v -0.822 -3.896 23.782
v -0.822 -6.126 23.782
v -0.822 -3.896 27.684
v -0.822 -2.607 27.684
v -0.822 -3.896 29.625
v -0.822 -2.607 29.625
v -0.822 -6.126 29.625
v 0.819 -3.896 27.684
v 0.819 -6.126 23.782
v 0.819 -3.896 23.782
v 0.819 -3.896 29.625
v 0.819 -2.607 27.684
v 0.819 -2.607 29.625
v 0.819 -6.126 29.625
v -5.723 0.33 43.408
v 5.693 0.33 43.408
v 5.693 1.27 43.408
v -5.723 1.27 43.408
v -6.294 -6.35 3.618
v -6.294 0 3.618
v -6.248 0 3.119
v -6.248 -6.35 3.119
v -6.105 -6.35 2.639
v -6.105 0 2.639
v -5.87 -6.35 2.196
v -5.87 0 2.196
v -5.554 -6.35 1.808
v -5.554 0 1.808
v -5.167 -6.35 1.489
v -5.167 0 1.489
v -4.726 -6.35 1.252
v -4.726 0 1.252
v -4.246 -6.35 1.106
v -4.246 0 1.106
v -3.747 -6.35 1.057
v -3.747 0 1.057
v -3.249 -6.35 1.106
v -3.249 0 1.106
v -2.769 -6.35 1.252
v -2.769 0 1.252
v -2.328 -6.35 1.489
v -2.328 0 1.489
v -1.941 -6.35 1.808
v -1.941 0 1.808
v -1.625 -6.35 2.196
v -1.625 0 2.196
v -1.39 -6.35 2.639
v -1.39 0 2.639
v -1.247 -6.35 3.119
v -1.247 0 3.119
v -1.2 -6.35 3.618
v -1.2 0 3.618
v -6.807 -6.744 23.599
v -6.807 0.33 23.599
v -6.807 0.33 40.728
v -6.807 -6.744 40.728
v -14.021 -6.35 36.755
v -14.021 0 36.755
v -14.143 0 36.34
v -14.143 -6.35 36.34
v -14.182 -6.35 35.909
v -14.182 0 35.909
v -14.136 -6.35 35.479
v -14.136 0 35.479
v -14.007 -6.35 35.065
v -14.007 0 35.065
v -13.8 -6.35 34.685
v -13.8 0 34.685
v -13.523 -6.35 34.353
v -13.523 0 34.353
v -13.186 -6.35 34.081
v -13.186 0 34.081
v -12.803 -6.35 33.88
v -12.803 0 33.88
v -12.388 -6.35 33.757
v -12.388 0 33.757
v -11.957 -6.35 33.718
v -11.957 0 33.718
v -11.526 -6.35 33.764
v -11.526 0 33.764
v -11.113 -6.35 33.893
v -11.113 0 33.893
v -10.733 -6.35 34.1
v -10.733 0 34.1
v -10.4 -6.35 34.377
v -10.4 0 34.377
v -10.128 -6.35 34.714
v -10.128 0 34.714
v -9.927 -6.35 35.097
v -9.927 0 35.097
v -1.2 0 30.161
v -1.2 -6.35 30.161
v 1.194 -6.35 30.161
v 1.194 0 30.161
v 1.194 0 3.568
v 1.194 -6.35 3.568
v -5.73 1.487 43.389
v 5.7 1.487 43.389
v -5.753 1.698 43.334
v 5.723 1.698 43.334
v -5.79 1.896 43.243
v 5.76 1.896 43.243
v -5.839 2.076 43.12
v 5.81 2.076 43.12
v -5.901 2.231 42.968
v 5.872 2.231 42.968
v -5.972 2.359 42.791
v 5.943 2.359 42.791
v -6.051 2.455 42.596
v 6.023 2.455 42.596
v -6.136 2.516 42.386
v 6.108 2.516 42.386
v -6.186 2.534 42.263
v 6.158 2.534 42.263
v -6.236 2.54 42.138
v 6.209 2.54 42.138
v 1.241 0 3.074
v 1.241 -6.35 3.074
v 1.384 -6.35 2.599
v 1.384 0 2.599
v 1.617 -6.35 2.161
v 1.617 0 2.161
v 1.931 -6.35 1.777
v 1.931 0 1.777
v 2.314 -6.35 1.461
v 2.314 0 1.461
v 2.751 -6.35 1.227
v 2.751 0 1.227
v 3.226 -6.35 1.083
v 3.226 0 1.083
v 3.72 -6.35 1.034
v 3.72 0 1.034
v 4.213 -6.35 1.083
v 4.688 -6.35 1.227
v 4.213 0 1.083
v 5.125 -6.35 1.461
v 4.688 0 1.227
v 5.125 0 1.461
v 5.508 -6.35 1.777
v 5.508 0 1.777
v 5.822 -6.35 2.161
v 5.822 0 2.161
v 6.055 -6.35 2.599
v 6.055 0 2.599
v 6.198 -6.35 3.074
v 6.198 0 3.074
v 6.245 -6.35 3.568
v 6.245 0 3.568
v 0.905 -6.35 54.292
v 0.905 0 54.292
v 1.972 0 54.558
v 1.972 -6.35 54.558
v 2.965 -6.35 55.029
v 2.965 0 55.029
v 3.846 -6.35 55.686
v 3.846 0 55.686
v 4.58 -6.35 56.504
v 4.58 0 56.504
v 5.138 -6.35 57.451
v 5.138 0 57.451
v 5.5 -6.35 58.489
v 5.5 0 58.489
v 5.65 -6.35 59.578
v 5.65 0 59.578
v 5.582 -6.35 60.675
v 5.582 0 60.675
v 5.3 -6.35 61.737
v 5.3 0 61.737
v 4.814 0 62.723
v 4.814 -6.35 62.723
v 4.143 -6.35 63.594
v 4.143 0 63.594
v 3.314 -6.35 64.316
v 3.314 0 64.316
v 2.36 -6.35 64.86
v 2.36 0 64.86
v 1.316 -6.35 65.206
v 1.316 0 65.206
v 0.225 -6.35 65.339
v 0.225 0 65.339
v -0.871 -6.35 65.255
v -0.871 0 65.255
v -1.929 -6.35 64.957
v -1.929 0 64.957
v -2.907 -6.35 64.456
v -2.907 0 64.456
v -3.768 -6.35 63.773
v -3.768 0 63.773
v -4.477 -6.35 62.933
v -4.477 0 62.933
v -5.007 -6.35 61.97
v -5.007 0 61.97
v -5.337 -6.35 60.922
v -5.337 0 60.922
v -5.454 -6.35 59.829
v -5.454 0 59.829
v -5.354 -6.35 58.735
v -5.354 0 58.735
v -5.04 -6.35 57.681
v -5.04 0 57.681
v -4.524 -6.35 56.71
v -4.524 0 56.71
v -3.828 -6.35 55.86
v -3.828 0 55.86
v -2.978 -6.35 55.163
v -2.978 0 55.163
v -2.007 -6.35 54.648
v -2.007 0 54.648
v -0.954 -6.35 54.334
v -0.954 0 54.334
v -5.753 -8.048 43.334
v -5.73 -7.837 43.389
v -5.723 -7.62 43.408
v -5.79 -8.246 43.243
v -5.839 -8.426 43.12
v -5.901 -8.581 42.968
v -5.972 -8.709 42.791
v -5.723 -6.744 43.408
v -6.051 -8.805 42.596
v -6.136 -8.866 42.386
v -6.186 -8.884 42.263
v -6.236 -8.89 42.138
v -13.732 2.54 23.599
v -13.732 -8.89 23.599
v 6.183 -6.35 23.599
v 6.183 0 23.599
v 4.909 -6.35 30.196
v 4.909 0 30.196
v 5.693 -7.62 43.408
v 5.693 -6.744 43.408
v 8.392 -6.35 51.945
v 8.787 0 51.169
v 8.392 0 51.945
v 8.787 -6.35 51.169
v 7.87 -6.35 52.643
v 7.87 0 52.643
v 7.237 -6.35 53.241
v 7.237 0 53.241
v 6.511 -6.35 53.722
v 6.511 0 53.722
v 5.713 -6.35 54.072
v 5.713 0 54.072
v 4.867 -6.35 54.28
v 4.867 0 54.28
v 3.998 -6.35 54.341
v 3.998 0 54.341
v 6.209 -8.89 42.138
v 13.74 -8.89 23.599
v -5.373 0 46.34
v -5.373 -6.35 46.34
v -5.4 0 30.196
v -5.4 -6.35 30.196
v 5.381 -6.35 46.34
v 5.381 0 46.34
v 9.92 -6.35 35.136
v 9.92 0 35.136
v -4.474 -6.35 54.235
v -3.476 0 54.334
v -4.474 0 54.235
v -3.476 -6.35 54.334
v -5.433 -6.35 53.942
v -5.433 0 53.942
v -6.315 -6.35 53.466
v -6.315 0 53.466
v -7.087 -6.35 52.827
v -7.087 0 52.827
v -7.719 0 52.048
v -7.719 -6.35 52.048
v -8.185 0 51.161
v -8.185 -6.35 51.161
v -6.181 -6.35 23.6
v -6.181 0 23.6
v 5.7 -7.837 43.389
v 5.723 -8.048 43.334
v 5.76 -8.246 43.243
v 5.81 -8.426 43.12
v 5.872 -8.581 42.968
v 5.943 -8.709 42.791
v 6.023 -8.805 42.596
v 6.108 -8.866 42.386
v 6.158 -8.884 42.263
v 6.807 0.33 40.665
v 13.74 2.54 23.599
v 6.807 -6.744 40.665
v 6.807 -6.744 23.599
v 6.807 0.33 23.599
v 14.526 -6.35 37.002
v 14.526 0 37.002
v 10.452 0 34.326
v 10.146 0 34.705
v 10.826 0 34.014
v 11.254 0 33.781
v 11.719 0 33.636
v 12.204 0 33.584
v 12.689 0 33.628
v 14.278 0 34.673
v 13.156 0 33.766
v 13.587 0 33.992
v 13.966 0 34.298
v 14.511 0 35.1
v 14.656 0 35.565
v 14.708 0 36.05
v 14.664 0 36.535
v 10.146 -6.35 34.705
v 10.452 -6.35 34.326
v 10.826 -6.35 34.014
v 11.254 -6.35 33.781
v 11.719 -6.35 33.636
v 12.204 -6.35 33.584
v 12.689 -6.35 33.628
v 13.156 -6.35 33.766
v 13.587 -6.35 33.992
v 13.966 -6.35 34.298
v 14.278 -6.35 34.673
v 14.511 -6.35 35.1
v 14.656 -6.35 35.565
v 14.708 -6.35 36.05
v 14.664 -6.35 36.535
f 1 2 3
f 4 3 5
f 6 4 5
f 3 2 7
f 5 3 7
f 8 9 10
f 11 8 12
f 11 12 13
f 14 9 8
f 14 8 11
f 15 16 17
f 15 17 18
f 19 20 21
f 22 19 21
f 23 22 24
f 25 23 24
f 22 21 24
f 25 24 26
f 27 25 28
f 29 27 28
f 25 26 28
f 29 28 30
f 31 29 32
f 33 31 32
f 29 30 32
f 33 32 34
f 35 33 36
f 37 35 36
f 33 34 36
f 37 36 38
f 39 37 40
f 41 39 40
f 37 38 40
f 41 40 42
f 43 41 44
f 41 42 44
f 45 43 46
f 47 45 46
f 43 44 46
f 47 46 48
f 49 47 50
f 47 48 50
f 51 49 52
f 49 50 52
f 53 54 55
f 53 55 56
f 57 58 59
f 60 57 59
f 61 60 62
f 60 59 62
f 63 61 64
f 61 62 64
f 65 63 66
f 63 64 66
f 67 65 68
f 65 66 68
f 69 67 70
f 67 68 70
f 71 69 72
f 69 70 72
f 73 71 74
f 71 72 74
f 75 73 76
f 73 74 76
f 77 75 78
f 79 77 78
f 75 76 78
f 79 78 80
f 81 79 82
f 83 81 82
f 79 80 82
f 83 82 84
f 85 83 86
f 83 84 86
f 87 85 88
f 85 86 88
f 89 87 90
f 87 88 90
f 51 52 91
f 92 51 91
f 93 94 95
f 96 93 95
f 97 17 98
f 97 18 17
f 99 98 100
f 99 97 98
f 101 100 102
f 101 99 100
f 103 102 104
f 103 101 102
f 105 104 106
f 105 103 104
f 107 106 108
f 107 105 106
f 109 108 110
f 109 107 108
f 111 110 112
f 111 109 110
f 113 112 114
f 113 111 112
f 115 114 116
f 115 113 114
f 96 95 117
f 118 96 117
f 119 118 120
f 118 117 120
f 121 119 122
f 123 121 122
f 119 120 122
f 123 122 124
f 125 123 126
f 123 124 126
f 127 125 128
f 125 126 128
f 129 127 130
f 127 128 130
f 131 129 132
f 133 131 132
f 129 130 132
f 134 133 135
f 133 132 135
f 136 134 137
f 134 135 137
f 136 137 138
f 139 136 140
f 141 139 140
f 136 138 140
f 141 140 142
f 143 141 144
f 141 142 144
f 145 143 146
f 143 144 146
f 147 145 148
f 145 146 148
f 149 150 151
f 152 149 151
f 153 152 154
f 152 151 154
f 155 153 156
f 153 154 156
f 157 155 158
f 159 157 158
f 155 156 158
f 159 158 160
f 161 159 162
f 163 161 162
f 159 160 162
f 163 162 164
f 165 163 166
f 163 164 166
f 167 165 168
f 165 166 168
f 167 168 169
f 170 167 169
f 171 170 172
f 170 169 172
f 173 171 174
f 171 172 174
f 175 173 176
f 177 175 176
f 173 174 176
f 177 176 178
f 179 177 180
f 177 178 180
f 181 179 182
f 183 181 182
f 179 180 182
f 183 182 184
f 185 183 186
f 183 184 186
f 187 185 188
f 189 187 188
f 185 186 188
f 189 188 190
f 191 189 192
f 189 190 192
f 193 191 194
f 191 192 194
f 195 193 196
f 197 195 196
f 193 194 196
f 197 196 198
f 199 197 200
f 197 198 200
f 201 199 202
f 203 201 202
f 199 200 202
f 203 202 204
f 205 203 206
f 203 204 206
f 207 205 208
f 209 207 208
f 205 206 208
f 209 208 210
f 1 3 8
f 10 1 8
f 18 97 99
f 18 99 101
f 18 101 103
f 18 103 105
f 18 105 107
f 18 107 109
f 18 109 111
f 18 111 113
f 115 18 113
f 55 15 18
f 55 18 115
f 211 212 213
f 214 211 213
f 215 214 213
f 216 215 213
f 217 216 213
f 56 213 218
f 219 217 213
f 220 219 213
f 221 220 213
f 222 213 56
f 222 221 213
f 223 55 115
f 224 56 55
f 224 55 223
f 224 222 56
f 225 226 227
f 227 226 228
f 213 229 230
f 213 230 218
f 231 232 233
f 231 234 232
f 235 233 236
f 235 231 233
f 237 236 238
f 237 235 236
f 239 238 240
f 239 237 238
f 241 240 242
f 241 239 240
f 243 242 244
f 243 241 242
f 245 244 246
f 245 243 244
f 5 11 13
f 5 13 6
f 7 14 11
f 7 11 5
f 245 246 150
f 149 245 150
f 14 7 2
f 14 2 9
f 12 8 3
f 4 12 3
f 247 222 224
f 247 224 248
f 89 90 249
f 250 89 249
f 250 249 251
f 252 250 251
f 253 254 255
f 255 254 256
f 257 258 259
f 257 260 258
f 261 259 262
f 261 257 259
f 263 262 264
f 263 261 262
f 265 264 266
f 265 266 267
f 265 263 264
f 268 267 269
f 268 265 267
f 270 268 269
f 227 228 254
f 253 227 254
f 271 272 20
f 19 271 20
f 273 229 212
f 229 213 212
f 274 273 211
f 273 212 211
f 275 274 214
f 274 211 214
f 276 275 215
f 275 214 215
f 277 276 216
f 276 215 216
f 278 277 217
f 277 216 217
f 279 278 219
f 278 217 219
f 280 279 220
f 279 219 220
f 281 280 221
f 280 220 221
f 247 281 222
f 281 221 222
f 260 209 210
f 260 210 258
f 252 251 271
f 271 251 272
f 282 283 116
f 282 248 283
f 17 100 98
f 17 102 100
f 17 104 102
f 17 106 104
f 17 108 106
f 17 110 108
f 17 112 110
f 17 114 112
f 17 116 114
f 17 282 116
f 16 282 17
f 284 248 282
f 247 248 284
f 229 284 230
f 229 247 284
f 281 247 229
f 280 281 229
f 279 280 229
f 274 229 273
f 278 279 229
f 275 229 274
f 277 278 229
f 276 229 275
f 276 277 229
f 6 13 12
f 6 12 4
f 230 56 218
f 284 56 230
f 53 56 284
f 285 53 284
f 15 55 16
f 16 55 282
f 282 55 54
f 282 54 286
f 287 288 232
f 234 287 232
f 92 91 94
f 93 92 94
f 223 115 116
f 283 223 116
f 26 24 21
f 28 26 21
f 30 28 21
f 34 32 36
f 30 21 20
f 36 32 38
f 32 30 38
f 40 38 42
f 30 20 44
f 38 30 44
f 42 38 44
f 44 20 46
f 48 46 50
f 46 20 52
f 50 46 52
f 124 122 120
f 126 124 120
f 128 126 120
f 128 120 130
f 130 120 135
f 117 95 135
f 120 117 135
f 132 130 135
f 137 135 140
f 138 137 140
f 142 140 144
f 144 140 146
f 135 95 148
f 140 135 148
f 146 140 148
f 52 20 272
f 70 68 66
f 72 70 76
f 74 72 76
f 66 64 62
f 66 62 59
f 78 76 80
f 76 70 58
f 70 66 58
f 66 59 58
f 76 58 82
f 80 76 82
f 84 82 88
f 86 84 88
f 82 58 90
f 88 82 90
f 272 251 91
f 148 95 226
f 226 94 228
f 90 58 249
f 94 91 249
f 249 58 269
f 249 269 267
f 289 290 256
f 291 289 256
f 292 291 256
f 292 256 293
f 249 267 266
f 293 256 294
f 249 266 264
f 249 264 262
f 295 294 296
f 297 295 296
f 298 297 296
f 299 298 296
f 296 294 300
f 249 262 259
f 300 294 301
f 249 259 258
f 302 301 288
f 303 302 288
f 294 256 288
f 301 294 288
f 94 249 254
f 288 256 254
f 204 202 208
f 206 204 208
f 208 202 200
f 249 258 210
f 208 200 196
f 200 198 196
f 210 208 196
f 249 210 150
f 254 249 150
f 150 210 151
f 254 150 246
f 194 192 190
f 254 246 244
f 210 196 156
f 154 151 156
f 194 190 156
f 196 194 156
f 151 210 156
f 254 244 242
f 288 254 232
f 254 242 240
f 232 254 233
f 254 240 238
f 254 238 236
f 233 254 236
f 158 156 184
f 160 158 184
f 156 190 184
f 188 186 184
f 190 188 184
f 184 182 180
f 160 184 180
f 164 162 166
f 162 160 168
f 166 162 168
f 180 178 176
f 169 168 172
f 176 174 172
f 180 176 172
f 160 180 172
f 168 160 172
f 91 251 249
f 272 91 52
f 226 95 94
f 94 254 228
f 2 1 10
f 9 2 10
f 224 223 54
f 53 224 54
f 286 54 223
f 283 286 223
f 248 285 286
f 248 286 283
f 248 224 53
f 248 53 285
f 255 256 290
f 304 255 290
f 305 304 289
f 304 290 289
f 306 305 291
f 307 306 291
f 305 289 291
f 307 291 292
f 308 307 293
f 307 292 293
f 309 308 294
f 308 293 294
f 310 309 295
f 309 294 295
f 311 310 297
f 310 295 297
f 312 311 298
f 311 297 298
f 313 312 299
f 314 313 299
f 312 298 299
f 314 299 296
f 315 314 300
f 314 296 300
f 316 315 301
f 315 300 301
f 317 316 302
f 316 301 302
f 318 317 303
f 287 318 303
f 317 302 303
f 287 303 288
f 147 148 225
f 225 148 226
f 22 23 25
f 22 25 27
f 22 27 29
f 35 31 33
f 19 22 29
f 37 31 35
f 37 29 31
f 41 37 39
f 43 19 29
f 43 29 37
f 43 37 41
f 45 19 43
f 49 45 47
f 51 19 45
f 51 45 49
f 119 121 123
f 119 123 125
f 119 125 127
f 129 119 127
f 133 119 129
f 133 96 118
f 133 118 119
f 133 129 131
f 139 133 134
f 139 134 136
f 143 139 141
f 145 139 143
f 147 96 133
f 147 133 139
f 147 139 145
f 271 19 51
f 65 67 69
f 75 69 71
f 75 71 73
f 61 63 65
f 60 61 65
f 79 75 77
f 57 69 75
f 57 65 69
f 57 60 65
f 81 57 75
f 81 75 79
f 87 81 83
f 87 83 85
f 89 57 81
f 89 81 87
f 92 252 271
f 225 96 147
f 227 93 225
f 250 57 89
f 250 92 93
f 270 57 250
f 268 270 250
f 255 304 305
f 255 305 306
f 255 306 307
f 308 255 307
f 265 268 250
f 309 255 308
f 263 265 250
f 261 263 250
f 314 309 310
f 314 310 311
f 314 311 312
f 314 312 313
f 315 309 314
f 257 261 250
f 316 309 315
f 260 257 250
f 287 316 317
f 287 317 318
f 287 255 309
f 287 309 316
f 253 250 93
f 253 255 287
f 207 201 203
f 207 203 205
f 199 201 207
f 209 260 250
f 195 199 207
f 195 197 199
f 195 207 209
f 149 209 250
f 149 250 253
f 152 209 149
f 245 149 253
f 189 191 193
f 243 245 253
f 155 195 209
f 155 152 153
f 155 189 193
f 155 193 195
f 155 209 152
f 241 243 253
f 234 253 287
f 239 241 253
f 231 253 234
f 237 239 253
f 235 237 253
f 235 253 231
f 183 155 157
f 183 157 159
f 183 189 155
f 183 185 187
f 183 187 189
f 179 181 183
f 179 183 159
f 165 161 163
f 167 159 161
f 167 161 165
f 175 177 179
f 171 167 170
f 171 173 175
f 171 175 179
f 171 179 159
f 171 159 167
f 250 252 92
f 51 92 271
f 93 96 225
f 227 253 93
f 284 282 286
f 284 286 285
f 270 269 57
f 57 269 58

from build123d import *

# Parameters (mm, degrees)
F2_DEPTH      = 6.35
F3_R          = 5.08
F5_DEPTH      = 8.89
F5_DEPTH_BACK = 2.54
F6_R          = 1.27
F7_W          = 13.6138349771
F7_H          = 7.0735514164
F8_DEPTH      = 19.9383124709
F10_W         = 1.6416277504
F10_H         = 5.8430470526
F11_DEPTH     = 2.2302670404
F12_W         = 1.6416277504
F12_H         = 1.9405391067
F13_DEPTH     = 1.2889460195


with BuildPart() as f2:
    # F1 (on Front) → F2 (new body)
    with BuildSketch(Plane.XZ):
        Polygon((0.4060455618, 46.3404494075), (5.3807954976, 46.3404494075), (9.9196409114, 35.1362316918), (14.5262840924, 37.0023897589), (7.4799486011, 54.3963897181), (0.9054420516, 54.2915910446), (0.9054420516, 55.7651892304), (-0.9540487081, 55.7651892304), (-0.9540487081, 54.3336731377), (-6.8995594781, 54.3336731377), (-14.0205790261, 36.7553143044), (-9.9272456086, 35.097098793), (-5.3725473987, 46.3404494075), align=None)
        Polygon((4.9092009358, 30.1961339726), (5.3807954976, 46.3404494075), (0.4060455618, 46.3404494075), (-5.3725473987, 46.3404494075), (-5.4000175056, 30.1961339726), align=None)
        with BuildLine():
            Line((14.5262840924, 37.0023897589), (9.9196409114, 35.1362316918))
            ThreePointArc((9.9196409114, 35.1362316918), (13.1560415355, 33.7659891348), (14.5262840924, 37.0023897589))
        make_face()
        Polygon((6.1827251721, 23.5992409005), (4.9092009358, 30.1961339726), (-5.4000175056, 30.1961339726), (-6.1811307742, 23.599889101), (-1.2004101882, 23.599889101), (-1.2004101882, 30.1607213914), (1.1938, 30.1607213914), (1.1938, 23.5538743436), align=None)
        Polygon((6.2452442944, 3.5675764084), (6.1827251721, 23.5992409005), (1.1938, 23.5538743436), (1.1938, 3.5675764084), align=None)
        with BuildLine():
            ThreePointArc((-14.0205790261, 36.7553143044), (-12.8030200731, 33.8795398399), (-9.9272456086, 35.097098793))
            Line((-9.9272456086, 35.097098793), (-14.0205790261, 36.7553143044))
        make_face()
        with BuildLine():
            ThreePointArc((1.1938, 3.5675764084), (3.7195221472, 1.0339591437), (6.2452442944, 3.5675764084))
            Line((6.2452442944, 3.5675764084), (1.1938, 3.5675764084))
        make_face()
        Polygon((-1.2004101882, 23.599889101), (-6.1811307742, 23.599889101), (-6.2944907695, 3.6183446646), (-1.2004101882, 3.6183446646), align=None)
        with BuildLine():
            Line((0.9054420516, 55.7651892304), (0.9054420516, 54.2915910446))
            ThreePointArc((0.9054420516, 54.2915910446), (0.2252362577, 65.3390929884), (-0.9540487081, 54.3336731377))
            Line((-0.9540487081, 54.3336731377), (-0.9540487081, 55.7651892304))
            Line((-0.9540487081, 55.7651892304), (0.9054420516, 55.7651892304))
        make_face()
        with BuildLine():
            Line((-1.2004101882, 3.6183446646), (-6.2944907695, 3.6183446646))
            ThreePointArc((-6.2944907695, 3.6183446646), (-3.7474504788, 1.0568134274), (-1.2004101882, 3.6183446646))
        make_face()
    extrude(amount=F2_DEPTH)

    # F3
    f3_edges = [f2.edges().sort_by_distance(p)[0] for p in [
        (-6.899559, -3.175, 54.333673),
        (7.479949, -3.175, 54.39639),
    ]]
    fillet(f3_edges, radius=F3_R)


with BuildPart() as f5:
    # F4 (on Front) → F5 (new body, two sides)
    with BuildSketch(Plane.XZ) as f5_sk:
        Polygon((-5.7229259983, 43.4081405401), (-13.7322756209, 23.5991440713), (13.739913702, 23.5991440713), (5.692876161, 43.4081405401), align=None)
    extrude(amount=F5_DEPTH)
    extrude(f5_sk.sketch, amount=-F5_DEPTH_BACK)

    # F6
    f6_edges = [f5.edges().sort_by_distance(p)[0] for p in [
        (-0.015025, 2.54, 43.408141),
        (-0.015025, -8.89, 43.408141),
    ]]
    fillet(f6_edges, radius=F6_R)

    # F7 (on face) → F8 (cut)
    with BuildSketch(Plane(origin=(0, 0, 23.5991440713), x_dir=(1, 0, 0), z_dir=(0, 0, -1))):
        with Locations((0.0002235174, 3.2069692388)):
            Rectangle(F7_W, F7_H)
    extrude(amount=-F8_DEPTH, mode=Mode.SUBTRACT)


with BuildPart() as f11:
    # F10 (on offset) → F11 (new body)
    with BuildSketch(Plane.XZ.offset(3.8956999779)):
        with Locations((-0.0014505931, 26.7030727118)):
            Rectangle(F10_W, F10_H)
    extrude(amount=F11_DEPTH)

    # F12 (on face) → F13 (join)
    with BuildSketch(Plane(origin=(0, -3.8956999779, 0), x_dir=(-1, 0, 0), z_dir=(0, 1, 0))):
        with Locations((0.0014505931, 28.6543266848)):
            Rectangle(F12_W, F12_H)
    extrude(amount=F13_DEPTH)


solid = Compound([f2.part, f5.part, f11.part])
